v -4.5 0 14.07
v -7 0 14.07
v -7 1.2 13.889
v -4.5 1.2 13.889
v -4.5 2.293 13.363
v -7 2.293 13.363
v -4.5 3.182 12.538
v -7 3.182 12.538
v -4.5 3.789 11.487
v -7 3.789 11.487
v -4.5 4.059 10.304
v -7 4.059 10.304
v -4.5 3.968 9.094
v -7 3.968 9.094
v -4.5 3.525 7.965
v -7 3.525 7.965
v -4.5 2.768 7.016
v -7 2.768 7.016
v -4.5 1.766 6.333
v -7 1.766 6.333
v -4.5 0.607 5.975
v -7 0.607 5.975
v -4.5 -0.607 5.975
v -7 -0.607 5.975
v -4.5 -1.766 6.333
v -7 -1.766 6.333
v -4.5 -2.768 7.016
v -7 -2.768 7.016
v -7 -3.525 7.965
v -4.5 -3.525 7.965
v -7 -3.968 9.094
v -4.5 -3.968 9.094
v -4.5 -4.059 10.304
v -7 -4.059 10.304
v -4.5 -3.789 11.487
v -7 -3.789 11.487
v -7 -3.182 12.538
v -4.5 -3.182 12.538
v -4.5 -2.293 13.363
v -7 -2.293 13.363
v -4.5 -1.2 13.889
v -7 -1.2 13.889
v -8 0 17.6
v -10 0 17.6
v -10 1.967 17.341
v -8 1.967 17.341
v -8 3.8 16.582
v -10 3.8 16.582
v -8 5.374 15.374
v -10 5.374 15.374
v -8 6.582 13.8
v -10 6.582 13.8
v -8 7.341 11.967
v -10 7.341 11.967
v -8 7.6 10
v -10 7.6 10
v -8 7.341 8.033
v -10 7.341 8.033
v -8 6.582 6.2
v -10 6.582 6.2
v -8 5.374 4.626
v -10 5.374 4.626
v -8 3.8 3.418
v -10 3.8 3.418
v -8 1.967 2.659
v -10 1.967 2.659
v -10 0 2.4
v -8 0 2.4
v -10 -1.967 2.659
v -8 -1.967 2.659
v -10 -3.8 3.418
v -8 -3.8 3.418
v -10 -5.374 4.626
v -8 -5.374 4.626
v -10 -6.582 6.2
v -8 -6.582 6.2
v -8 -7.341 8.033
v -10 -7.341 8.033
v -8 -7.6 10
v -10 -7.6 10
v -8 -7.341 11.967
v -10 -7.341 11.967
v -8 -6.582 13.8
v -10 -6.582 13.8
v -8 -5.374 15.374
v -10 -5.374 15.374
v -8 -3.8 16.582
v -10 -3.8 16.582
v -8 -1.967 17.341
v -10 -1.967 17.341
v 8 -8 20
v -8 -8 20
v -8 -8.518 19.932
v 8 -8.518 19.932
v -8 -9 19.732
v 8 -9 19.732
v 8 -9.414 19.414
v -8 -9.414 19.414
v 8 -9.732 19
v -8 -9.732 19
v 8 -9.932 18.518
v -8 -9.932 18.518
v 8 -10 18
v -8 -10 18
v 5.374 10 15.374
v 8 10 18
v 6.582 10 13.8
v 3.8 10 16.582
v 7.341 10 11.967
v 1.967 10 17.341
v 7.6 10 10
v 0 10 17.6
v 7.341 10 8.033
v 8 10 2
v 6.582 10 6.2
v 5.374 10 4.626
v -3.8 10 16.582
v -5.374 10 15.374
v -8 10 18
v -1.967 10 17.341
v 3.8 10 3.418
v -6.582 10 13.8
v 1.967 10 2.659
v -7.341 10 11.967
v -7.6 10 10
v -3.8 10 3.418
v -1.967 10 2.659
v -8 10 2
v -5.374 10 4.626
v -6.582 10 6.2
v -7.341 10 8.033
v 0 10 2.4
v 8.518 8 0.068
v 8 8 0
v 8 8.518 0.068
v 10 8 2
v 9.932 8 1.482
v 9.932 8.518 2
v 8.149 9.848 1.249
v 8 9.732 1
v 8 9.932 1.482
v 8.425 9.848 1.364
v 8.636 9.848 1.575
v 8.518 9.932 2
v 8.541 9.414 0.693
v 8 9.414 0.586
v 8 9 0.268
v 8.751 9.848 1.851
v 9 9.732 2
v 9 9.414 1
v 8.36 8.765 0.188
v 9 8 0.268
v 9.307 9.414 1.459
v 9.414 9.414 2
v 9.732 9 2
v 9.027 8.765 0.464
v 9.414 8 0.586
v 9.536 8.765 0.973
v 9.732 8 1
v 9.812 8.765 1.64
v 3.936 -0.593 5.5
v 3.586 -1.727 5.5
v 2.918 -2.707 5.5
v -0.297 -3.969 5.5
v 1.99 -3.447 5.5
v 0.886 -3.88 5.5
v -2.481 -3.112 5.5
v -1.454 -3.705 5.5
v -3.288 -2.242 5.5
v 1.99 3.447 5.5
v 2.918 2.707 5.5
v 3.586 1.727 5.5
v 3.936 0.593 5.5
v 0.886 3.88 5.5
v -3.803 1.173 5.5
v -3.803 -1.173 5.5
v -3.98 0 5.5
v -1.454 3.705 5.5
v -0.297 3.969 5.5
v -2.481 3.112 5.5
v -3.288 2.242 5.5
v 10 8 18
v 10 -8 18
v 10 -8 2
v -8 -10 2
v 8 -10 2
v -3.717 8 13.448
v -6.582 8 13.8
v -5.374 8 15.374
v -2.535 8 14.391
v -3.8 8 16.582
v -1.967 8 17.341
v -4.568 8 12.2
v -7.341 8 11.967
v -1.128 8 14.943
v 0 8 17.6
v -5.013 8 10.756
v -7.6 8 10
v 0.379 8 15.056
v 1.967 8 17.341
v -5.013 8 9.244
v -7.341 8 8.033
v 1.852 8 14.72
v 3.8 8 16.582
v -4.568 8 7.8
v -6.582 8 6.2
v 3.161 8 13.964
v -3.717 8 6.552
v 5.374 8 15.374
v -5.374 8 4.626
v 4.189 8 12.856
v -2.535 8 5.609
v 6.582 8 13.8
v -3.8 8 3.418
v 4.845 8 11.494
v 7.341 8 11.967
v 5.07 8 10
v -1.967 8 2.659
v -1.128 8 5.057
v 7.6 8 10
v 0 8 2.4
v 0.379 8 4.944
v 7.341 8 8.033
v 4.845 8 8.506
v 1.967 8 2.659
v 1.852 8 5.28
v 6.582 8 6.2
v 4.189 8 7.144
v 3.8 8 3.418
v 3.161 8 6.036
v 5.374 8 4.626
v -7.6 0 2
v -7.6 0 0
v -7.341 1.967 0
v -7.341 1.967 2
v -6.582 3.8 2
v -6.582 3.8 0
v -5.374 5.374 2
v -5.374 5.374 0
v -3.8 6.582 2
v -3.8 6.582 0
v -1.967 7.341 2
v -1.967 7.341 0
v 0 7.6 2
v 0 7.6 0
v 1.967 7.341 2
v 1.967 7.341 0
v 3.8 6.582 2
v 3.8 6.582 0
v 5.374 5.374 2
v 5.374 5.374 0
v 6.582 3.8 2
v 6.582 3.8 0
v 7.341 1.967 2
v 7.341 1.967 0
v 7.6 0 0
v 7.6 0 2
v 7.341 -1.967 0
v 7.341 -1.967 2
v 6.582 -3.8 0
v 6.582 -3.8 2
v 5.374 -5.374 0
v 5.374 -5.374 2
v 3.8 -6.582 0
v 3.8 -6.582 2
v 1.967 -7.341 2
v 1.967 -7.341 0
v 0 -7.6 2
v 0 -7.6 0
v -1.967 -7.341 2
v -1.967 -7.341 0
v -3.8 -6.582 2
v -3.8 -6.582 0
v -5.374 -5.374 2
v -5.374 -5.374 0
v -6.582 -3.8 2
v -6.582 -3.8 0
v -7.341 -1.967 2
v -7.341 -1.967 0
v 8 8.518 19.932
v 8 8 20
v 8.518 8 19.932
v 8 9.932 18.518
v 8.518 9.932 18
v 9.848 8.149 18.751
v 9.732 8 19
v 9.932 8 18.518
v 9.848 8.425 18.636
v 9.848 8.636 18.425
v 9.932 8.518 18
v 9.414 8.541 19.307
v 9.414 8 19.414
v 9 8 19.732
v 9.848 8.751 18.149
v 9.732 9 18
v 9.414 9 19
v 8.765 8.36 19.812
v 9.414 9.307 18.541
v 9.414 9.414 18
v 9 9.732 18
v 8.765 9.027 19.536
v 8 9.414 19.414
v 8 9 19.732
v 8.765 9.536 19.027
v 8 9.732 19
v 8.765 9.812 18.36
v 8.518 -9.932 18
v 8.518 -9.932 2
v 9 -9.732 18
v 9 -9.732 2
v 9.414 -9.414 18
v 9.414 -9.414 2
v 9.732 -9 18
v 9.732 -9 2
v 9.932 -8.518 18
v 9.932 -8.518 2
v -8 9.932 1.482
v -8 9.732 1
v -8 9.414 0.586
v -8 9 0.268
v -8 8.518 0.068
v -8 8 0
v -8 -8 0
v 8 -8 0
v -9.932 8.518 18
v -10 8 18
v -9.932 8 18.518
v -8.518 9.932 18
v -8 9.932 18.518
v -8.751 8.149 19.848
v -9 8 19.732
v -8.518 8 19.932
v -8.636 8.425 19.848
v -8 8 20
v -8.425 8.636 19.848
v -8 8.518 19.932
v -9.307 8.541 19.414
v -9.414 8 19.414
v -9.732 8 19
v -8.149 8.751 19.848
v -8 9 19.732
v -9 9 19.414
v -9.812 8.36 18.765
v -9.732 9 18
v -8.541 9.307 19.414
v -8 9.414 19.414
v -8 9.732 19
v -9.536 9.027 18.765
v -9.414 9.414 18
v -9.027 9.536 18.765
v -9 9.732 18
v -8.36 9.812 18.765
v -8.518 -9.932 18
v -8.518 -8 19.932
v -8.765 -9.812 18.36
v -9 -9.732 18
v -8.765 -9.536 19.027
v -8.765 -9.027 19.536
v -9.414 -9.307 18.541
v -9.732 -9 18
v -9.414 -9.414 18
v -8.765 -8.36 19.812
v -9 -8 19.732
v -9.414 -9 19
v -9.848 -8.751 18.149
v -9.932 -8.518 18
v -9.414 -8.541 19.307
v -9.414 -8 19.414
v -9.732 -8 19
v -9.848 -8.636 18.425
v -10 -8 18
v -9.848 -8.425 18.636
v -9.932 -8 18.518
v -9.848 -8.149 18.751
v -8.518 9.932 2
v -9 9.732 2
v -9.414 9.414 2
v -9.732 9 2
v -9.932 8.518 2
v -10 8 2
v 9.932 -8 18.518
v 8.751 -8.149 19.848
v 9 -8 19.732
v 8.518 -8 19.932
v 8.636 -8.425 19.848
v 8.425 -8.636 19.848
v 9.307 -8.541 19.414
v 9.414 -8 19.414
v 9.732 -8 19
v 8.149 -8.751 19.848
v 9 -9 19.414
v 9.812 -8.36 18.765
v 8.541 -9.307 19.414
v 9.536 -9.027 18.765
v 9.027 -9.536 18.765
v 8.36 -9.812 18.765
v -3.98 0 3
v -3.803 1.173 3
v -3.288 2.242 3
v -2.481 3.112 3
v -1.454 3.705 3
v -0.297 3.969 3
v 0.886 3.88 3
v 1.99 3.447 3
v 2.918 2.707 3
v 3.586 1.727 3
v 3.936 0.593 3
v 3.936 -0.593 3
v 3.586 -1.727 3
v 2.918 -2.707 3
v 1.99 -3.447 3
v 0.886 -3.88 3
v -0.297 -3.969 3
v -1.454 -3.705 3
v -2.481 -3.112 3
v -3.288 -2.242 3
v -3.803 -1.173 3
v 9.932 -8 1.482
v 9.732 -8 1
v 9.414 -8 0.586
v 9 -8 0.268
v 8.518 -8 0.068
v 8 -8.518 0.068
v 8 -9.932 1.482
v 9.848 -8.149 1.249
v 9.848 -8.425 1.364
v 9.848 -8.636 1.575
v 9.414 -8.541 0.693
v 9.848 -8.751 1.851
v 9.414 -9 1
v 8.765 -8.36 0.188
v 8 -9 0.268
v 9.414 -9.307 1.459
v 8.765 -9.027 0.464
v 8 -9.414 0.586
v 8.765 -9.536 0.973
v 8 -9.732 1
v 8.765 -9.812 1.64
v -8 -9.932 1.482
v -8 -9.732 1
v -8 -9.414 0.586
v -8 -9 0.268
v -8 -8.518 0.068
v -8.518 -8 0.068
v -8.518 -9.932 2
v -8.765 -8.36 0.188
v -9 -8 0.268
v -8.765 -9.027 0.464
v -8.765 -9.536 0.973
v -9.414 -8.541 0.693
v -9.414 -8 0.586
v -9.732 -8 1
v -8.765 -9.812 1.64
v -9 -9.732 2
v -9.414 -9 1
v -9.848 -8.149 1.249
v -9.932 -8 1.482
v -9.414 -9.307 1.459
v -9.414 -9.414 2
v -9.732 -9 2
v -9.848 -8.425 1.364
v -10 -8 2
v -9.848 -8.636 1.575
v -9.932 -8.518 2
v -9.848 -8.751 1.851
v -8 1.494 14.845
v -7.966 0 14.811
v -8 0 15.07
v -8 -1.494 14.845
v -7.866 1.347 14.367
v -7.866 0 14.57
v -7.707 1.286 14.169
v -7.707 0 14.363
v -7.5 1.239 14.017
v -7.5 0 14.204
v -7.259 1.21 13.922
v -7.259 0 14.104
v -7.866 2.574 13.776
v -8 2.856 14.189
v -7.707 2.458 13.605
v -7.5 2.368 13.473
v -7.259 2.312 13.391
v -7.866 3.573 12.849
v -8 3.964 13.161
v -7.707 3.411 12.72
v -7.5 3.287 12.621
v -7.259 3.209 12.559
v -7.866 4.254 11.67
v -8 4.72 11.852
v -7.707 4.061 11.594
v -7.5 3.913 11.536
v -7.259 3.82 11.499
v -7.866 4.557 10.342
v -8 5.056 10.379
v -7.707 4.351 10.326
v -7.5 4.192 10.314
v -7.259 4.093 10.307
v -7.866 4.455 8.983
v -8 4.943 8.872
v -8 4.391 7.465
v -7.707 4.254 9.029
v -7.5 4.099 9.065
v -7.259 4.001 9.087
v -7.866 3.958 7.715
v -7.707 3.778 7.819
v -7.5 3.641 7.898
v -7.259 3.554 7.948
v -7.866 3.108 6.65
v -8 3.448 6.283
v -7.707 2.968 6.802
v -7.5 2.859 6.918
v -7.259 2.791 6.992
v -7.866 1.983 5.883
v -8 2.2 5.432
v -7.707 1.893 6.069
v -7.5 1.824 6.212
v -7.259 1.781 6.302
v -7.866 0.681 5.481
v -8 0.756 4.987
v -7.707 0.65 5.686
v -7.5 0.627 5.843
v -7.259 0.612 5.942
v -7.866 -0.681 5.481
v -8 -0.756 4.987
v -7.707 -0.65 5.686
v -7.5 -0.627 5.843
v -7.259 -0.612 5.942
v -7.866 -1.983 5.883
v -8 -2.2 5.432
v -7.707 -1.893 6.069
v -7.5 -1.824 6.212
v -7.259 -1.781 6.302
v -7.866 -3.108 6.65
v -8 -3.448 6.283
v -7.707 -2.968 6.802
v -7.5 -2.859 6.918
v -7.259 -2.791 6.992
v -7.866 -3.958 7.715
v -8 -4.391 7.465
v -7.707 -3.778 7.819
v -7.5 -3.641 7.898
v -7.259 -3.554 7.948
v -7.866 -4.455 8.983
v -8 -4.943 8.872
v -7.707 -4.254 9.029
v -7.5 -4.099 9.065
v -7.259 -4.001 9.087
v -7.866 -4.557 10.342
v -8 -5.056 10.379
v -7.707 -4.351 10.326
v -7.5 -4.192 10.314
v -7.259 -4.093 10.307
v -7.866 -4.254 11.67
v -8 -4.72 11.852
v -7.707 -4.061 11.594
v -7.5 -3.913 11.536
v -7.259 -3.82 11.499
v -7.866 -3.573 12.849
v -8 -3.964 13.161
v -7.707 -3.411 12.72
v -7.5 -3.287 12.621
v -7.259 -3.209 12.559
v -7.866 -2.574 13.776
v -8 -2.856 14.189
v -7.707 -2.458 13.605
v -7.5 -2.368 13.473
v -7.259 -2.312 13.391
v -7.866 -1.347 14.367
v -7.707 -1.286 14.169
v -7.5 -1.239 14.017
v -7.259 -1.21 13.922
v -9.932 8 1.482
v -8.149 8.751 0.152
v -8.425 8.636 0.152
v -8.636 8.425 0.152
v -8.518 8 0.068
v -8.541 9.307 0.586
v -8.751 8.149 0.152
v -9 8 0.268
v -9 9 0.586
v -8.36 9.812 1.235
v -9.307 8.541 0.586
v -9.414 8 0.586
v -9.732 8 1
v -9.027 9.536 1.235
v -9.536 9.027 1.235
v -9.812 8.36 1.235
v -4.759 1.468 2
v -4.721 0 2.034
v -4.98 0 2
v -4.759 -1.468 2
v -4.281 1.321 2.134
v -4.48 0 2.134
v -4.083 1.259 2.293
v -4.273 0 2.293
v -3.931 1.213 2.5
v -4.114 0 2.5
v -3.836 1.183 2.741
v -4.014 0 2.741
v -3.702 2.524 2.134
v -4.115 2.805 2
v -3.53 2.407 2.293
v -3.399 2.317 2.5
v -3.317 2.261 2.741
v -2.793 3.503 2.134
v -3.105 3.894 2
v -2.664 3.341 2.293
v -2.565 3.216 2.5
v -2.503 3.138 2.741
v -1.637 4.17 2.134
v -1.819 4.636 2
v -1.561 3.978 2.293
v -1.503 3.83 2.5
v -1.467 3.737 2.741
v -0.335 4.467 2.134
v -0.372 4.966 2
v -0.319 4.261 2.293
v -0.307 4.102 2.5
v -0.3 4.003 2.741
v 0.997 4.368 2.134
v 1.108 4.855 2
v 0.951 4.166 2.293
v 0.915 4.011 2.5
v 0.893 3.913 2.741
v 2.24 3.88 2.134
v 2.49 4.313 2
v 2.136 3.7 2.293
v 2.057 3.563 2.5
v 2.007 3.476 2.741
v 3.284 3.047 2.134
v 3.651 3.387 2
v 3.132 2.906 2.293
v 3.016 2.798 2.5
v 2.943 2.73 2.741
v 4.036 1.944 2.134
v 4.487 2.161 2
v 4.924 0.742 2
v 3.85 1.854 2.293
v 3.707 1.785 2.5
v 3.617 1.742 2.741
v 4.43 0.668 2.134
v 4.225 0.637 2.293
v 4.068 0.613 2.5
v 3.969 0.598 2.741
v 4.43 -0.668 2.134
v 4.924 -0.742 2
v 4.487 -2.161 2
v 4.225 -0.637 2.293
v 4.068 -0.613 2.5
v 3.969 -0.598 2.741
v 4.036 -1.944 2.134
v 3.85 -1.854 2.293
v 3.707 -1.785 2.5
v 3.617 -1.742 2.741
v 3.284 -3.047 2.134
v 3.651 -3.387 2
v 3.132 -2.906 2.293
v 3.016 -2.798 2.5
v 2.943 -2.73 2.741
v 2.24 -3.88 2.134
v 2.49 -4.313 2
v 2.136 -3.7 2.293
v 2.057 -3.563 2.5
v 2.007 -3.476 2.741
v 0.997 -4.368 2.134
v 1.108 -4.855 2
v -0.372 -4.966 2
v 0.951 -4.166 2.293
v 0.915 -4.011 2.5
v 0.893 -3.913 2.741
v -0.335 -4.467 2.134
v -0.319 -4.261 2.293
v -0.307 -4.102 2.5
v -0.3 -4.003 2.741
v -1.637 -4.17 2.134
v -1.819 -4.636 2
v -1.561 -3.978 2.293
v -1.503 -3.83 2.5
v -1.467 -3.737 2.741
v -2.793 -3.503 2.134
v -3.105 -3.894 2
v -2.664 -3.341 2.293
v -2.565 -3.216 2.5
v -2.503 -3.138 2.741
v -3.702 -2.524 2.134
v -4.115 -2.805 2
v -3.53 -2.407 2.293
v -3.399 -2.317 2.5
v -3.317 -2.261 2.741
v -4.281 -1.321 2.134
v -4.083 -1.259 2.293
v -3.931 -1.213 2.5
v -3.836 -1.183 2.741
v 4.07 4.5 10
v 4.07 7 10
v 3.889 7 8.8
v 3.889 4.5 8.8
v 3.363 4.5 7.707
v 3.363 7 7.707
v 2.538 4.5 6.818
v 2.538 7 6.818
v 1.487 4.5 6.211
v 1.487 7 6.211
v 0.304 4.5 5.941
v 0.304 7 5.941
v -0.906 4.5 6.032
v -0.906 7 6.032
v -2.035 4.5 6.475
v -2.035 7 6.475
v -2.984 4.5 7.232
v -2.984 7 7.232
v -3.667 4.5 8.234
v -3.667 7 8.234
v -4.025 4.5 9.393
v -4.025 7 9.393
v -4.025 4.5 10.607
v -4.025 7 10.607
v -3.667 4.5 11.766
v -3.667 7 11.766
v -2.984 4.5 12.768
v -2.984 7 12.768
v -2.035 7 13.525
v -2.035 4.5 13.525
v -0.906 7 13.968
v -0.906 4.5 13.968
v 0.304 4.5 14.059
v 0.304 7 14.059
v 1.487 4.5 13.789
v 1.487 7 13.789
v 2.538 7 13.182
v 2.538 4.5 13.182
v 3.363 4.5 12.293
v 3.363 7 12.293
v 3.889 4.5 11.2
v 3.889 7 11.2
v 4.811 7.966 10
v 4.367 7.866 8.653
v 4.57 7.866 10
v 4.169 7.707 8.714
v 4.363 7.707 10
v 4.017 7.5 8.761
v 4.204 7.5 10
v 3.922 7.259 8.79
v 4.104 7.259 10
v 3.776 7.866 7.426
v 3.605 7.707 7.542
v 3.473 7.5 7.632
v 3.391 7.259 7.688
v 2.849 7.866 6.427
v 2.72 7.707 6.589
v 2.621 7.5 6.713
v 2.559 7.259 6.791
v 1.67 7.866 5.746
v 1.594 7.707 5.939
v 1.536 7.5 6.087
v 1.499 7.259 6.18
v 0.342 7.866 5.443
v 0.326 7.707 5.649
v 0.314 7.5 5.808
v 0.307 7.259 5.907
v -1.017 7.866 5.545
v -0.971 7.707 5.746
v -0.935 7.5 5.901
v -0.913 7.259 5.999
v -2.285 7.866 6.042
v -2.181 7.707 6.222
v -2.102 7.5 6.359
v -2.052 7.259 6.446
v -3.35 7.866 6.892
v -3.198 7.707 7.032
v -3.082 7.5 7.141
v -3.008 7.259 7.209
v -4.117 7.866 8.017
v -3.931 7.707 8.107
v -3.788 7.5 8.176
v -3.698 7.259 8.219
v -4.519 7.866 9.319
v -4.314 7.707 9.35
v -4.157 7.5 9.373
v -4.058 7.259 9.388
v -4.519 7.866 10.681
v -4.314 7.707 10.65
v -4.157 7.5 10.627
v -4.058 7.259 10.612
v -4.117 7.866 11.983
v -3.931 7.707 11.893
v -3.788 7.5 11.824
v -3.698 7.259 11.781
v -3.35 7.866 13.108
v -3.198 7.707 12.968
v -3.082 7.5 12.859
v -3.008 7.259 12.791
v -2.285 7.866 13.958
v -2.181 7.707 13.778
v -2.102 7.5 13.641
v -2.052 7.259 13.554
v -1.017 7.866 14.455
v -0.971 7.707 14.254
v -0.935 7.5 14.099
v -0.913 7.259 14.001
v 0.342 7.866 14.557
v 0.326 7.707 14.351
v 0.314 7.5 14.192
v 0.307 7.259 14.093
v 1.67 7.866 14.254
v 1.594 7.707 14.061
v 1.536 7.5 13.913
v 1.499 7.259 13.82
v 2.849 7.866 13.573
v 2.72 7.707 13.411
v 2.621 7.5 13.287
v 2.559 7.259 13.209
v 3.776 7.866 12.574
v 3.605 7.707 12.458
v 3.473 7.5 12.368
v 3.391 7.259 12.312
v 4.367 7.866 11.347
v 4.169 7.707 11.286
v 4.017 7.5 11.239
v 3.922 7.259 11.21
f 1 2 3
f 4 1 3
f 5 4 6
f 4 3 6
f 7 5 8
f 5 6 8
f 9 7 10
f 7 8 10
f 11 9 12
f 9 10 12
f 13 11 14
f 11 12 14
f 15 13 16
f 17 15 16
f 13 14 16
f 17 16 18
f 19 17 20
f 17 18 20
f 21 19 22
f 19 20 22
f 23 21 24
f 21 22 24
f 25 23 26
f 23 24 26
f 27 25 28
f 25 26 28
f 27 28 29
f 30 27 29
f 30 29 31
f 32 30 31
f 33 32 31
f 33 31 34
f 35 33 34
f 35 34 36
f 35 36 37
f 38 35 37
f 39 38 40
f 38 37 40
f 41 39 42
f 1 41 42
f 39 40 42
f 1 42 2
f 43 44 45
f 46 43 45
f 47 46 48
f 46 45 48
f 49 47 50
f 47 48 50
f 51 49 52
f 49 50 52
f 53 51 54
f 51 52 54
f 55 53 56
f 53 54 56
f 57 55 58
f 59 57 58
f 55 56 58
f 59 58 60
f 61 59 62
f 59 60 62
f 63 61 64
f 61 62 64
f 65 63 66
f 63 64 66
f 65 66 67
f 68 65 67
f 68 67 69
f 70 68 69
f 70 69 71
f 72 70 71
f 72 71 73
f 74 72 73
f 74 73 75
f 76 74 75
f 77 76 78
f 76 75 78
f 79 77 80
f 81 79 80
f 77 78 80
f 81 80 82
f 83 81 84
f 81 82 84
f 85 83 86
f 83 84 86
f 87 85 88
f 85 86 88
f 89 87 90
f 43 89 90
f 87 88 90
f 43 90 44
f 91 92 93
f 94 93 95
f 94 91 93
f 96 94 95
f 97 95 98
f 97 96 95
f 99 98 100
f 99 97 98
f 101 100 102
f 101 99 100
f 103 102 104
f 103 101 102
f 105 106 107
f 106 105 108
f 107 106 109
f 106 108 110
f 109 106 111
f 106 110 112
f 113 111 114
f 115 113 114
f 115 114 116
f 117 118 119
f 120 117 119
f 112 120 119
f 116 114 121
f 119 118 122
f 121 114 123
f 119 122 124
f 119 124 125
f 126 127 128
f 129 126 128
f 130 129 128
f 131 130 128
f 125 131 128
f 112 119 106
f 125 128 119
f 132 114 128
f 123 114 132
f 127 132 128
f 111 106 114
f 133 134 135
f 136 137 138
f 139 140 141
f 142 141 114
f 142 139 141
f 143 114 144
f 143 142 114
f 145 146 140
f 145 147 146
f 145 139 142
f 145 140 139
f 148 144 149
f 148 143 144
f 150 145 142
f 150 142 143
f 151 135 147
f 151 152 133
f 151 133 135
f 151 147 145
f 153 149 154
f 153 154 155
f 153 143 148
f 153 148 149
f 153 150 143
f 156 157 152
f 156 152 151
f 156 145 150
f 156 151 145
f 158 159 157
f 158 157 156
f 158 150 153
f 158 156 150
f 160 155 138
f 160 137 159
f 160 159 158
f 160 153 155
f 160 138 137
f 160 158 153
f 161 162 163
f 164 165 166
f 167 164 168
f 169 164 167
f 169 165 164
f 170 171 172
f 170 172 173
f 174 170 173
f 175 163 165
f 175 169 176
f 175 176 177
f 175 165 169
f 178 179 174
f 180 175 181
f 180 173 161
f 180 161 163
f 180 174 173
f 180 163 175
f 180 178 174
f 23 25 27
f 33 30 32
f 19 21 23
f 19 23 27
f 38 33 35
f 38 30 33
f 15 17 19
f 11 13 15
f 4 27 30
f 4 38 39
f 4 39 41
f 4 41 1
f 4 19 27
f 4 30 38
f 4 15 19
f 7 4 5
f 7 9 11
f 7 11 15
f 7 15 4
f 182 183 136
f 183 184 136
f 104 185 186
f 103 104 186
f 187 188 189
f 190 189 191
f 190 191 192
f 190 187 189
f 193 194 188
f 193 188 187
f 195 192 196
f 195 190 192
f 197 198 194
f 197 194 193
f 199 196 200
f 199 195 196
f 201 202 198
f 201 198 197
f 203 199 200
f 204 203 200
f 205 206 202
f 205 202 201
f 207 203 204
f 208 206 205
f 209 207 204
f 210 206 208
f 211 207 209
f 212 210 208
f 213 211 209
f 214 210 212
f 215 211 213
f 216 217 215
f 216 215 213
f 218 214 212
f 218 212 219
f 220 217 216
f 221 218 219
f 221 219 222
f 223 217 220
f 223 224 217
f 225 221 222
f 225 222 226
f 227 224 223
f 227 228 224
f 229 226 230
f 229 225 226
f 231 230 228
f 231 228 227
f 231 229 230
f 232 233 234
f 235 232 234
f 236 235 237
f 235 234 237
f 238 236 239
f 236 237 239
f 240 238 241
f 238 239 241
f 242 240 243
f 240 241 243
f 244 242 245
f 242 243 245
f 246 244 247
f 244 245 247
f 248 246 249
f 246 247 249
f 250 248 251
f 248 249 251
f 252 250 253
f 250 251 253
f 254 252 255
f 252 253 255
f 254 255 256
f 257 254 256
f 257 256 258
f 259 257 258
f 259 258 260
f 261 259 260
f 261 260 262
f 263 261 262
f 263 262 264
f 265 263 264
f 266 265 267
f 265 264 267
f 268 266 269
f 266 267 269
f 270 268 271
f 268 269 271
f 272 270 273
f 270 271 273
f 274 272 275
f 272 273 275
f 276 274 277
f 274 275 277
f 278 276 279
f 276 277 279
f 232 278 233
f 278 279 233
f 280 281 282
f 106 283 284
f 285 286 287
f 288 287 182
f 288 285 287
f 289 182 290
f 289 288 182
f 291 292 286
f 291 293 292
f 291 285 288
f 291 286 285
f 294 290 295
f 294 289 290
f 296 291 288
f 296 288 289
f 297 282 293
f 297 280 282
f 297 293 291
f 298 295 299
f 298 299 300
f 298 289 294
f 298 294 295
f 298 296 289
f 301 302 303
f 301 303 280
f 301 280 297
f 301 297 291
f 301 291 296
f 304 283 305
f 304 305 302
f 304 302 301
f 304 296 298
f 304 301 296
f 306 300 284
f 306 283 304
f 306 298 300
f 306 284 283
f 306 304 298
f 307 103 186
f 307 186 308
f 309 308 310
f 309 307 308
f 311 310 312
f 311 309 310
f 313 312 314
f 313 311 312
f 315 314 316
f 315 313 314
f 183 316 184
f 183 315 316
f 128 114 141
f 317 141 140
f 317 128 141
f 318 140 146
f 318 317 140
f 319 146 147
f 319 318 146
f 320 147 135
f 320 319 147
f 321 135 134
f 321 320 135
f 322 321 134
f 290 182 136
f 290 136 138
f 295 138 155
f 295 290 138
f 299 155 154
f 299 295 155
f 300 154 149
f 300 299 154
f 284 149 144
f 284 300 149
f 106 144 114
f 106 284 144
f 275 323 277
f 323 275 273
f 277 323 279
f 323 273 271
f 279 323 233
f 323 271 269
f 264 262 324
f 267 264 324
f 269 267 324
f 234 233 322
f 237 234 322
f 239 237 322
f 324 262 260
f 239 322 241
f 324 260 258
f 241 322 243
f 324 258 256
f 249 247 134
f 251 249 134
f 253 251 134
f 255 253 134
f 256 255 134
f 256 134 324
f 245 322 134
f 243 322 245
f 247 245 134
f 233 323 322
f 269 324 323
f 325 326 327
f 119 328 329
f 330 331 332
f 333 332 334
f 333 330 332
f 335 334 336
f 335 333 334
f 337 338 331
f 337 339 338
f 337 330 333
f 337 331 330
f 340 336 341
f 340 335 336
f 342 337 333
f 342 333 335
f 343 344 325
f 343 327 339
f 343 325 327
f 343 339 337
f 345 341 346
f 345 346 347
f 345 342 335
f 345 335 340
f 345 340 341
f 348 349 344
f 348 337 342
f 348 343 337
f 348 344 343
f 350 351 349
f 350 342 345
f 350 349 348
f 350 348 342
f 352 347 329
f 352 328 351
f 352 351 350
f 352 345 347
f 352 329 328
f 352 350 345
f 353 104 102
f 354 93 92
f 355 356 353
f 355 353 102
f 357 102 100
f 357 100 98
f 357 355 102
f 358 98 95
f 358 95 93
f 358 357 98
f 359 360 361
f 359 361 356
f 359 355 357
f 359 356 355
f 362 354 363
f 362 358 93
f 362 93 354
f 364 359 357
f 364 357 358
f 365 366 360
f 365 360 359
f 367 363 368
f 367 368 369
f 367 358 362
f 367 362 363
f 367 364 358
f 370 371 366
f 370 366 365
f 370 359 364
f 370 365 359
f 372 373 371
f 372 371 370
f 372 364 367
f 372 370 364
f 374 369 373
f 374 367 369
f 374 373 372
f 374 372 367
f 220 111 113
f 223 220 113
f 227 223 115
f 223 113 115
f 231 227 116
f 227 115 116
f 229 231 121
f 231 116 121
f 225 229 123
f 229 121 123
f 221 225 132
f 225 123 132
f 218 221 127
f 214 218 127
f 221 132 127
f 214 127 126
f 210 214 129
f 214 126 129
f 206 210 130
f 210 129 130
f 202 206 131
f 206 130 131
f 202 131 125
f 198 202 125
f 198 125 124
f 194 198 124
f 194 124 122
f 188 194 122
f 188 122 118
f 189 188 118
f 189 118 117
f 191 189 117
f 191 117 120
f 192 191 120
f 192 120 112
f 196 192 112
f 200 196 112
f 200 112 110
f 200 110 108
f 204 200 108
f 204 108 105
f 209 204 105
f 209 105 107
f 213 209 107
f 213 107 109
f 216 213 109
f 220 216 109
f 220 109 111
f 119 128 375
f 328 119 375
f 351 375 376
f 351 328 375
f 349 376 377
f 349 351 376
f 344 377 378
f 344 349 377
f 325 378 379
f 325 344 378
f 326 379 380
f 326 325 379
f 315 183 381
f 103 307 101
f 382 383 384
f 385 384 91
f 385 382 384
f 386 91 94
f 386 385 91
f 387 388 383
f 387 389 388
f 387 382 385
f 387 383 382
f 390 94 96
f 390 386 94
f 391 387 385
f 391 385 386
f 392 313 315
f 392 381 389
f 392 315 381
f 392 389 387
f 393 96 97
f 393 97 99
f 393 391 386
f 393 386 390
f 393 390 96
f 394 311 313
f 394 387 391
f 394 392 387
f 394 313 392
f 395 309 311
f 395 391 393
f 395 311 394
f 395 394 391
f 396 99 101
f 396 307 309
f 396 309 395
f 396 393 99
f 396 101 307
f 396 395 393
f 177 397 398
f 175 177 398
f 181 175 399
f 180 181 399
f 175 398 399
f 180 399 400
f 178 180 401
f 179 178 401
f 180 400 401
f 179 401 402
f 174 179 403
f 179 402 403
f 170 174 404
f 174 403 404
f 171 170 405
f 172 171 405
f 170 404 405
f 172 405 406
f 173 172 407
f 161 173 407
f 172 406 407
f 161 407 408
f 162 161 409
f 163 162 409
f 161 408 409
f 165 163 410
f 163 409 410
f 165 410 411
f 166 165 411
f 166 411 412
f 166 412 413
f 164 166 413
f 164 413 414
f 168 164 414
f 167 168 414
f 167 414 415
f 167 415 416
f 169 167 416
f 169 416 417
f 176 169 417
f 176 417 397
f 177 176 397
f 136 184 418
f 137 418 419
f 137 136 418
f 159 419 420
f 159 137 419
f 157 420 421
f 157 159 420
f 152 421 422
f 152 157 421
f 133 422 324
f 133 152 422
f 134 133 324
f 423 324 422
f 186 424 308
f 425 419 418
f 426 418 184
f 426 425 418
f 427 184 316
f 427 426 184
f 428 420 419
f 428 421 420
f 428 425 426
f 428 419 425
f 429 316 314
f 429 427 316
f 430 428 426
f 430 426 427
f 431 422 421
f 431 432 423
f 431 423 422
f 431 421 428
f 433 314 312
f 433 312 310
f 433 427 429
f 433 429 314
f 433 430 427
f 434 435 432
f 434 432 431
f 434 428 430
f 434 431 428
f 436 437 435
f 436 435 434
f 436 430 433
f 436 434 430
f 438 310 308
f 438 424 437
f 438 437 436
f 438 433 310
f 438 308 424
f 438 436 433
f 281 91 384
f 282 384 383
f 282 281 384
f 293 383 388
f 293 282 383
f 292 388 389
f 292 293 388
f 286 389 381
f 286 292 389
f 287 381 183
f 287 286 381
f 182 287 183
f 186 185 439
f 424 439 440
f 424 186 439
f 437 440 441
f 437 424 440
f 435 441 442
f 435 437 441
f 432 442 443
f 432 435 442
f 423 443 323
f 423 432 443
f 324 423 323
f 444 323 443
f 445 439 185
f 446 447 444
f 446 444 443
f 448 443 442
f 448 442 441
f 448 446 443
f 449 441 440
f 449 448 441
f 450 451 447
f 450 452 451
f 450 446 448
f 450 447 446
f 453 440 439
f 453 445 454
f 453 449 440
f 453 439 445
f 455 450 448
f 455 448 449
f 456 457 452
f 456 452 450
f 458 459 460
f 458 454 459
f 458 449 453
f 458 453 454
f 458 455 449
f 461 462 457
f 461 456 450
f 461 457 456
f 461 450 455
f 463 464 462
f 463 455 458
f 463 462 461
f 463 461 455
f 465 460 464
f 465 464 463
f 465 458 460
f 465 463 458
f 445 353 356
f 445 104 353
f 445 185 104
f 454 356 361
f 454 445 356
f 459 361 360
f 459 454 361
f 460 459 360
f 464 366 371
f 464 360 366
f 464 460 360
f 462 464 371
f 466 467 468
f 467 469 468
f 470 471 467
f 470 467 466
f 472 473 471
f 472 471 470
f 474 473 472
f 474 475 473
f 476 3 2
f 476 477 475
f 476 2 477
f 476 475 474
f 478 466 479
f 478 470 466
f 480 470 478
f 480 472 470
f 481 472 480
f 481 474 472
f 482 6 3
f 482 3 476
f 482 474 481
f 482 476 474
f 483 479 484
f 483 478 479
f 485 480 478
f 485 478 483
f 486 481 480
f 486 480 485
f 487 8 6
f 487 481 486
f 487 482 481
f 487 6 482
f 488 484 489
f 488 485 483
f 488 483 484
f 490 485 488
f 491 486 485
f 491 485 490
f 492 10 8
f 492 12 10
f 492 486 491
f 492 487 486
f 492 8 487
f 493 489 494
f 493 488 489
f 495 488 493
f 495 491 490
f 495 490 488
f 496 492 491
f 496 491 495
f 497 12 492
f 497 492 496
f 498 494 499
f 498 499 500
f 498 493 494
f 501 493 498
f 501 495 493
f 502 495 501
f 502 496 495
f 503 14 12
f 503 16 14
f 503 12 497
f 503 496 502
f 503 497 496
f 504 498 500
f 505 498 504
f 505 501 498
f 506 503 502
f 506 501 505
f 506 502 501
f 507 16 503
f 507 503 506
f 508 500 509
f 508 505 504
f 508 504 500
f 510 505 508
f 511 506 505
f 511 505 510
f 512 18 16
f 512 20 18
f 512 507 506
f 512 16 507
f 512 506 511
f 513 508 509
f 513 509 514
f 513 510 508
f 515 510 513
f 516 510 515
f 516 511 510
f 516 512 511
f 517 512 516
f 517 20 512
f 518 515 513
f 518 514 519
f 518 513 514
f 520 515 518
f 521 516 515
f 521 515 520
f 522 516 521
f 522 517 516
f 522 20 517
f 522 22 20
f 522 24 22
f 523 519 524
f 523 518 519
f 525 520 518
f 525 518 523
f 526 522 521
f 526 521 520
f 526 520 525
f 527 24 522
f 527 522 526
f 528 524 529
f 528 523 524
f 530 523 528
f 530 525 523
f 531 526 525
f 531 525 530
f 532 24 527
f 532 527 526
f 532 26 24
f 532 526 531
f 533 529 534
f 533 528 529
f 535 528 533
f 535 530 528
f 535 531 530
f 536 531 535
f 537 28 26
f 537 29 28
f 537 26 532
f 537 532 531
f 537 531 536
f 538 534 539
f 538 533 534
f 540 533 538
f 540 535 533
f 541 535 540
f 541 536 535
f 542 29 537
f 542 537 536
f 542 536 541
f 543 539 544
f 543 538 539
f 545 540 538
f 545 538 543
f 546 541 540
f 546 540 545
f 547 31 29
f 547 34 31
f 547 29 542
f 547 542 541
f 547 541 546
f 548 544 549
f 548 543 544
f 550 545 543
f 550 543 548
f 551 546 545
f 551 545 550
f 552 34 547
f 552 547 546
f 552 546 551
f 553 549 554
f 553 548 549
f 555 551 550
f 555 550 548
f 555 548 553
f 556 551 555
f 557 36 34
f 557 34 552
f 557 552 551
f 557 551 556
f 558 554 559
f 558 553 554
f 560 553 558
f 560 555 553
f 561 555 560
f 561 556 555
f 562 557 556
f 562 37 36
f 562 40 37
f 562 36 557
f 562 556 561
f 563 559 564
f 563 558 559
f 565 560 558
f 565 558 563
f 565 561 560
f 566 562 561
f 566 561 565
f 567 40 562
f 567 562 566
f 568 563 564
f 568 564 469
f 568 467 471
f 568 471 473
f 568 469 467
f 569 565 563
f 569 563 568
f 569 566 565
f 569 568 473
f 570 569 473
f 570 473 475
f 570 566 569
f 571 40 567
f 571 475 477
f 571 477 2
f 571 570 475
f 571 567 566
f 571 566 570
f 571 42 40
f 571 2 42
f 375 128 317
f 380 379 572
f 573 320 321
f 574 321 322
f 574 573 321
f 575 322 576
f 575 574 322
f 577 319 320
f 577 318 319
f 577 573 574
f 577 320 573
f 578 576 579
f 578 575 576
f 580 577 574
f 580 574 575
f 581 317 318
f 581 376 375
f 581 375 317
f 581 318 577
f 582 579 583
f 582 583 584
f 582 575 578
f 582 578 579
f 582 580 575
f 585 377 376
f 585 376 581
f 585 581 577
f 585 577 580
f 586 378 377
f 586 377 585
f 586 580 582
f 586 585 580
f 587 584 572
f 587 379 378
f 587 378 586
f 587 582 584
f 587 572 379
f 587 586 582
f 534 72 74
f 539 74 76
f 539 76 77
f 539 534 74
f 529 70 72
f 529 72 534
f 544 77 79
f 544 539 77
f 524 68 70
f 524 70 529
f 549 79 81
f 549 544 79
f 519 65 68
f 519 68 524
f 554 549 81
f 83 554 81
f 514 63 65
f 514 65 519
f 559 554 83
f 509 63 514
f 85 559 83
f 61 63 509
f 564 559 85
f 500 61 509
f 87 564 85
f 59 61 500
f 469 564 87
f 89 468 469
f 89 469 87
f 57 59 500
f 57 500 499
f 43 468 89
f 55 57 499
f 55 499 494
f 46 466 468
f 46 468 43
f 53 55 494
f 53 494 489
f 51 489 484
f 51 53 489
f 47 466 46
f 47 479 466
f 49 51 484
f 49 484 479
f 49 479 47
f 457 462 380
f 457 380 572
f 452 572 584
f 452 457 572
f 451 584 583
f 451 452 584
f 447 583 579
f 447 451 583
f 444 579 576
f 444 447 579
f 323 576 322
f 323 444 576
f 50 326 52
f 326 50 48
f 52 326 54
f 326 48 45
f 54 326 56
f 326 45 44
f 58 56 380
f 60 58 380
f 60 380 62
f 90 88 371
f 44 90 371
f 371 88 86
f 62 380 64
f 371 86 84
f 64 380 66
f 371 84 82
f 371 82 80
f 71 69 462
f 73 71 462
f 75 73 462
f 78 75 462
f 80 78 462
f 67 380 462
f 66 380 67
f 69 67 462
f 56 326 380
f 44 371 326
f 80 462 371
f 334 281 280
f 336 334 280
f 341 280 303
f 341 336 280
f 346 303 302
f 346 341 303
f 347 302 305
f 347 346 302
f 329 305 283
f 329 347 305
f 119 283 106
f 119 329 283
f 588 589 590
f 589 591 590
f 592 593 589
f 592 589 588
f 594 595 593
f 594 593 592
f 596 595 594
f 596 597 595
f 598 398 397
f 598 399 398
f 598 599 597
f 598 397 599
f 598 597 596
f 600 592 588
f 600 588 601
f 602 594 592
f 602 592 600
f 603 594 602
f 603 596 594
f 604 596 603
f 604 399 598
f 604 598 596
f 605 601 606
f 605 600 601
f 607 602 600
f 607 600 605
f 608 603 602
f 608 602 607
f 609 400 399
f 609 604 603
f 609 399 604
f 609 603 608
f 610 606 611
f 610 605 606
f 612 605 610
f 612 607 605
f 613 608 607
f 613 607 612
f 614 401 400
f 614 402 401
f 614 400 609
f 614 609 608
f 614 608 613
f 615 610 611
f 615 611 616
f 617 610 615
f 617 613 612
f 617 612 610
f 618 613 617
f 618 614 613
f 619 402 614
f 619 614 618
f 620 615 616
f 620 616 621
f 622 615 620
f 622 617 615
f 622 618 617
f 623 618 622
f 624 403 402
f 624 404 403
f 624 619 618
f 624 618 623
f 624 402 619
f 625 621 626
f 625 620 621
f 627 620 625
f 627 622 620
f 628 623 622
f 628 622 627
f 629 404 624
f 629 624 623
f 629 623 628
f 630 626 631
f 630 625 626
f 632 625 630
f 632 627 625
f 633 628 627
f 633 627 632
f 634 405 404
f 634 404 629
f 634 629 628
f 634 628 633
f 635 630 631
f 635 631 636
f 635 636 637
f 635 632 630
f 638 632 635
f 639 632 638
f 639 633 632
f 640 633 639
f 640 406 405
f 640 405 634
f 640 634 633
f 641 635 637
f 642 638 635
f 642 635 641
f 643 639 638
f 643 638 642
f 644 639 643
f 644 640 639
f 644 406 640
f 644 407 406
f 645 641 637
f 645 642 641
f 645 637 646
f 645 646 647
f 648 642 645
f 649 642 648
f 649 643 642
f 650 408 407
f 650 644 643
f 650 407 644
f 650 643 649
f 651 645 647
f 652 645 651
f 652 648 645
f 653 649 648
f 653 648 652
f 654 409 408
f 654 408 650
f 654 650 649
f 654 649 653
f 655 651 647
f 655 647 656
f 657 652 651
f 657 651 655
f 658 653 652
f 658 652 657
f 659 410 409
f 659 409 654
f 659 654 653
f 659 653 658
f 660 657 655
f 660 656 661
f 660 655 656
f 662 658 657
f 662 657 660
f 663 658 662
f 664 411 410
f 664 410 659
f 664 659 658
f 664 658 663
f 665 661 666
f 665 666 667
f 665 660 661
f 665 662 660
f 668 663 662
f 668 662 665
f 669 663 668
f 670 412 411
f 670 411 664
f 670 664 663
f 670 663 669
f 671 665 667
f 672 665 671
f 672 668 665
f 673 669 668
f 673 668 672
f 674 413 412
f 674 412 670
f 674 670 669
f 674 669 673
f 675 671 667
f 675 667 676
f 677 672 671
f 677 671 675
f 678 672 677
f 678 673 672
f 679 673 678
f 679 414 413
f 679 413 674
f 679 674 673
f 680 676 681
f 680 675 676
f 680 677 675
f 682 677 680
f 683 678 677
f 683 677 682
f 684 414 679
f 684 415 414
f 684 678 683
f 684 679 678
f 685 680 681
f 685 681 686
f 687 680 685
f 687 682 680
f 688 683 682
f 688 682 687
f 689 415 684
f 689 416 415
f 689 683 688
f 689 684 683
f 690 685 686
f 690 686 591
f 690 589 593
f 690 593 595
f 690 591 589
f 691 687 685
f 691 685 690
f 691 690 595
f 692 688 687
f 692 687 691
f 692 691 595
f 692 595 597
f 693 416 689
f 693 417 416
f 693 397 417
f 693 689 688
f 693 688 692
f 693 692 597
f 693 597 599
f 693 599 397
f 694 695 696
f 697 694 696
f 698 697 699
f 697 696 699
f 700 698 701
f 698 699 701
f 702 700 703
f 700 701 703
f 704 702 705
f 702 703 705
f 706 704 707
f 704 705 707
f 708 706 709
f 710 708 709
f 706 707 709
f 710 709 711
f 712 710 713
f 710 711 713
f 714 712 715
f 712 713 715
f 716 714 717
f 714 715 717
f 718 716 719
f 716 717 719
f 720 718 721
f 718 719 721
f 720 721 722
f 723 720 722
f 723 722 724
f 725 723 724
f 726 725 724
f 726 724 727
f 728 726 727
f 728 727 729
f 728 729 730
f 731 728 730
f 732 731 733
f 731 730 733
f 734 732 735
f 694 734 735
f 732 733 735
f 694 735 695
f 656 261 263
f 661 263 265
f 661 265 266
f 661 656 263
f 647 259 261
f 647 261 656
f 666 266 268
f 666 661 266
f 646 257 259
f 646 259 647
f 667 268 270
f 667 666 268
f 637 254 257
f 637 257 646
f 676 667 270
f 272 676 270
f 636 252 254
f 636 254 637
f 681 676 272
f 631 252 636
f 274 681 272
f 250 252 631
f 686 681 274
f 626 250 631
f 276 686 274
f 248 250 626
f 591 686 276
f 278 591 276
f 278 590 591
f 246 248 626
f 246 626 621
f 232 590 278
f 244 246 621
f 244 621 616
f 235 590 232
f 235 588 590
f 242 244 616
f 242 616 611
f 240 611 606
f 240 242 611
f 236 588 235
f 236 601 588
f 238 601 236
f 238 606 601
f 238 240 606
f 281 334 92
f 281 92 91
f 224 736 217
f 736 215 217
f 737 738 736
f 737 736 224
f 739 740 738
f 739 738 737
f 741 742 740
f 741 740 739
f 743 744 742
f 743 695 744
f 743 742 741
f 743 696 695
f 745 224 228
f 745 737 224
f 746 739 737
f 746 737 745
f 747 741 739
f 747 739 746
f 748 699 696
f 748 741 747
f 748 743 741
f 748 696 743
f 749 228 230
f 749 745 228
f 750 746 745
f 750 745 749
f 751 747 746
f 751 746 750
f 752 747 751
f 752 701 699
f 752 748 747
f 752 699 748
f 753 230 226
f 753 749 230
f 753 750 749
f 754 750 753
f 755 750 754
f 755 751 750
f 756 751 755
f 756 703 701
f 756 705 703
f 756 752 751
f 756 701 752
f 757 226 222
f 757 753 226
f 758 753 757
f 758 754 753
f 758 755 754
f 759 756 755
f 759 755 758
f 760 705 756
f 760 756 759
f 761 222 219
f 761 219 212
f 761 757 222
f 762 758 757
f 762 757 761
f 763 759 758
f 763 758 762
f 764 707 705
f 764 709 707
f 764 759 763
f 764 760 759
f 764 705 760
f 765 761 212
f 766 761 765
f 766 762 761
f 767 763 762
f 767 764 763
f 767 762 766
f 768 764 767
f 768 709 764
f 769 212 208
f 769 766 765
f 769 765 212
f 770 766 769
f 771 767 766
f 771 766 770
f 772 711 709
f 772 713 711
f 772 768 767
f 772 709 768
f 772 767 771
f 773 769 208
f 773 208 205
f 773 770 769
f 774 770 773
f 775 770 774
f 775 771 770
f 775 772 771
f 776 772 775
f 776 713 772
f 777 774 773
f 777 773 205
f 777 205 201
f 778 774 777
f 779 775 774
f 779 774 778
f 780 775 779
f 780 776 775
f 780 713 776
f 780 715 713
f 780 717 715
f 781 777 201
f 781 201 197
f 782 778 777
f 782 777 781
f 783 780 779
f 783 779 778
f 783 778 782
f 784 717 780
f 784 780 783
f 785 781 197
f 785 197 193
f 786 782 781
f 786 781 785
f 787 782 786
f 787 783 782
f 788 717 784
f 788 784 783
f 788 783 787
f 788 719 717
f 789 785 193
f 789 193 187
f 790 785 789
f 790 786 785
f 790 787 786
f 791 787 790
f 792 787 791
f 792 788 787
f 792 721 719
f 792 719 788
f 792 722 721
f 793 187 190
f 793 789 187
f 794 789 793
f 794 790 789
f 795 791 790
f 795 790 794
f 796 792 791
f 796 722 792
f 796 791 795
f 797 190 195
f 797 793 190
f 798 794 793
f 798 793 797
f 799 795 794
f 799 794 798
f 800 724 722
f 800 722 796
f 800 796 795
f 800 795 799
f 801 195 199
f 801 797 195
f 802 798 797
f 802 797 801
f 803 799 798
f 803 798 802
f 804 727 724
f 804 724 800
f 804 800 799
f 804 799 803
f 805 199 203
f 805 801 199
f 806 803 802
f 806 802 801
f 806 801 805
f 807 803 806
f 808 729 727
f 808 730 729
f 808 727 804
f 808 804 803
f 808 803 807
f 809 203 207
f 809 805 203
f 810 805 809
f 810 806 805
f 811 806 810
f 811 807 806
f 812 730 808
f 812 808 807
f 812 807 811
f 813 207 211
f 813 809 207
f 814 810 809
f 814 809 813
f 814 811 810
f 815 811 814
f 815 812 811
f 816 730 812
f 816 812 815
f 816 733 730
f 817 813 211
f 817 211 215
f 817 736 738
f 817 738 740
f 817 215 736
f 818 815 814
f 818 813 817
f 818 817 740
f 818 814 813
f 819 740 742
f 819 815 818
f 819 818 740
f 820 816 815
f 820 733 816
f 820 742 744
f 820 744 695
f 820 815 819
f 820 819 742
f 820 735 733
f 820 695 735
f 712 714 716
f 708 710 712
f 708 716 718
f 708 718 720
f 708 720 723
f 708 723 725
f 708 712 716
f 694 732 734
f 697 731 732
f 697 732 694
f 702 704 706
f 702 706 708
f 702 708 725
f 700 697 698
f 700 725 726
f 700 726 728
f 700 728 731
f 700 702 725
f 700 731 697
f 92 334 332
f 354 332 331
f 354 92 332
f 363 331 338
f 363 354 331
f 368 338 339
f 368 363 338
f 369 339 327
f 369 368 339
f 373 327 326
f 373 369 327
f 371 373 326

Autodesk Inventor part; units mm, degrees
ref_plane "YZ Plane" through (0, 0, 0) normal (1, 0, 0) x (0, 1, 0)
ref_plane "XZ Plane" through (0, 0, 0) normal (0, 1, 0) x (-1, 0, 0)
ref_plane "XY Plane" through (0, 0, 0) normal (0, 0, 1) x (1, 0, 0)
sketch "Sketch1" plane through (0, 0, 0) normal (0, 0, 1) x (1, 0, 0)
  line L0 (-10, -10) -> (10, -10)
  line L1 (10, -10) -> (10, 10)
  line L2 (10, 10) -> (-10, 10)
  line L3 (-10, 10) -> (-10, -10)
  line L4 (-10, -10) -> (10, 10) construction
  line L5 (10, -10) -> (-10, 10) construction
  point P0 (0, 0)
  dimension "d0" = 20
  dimension "d1" = 20
extrude "Extrusion1" add sketch "Sketch1" along normal blind 20
sketch "Sketch2" plane through (-10, 10, 0) normal (0, 1, 0) x (1, 0, 0)
  circle A0 centre (10, -10) radius 7.6
  line L0 (0, 0) -> (0, -20) projected
  point P0 (10, 0)
  dimension "d4" = 15.2
  dimension "d5" = 10
  dimension "d6" = 10
extrude "Extrusion2" cut sketch "Sketch2" against normal blind 2
sketch "Sketch3" plane through (0, 0, 0) normal (0, 0, -1) x (-1, 0, 0)
  circle A0 centre (0, 0) radius 7.6
  dimension "d9" = 15.2
extrude "Extrusion3" cut sketch "Sketch3" against normal blind 2
sketch "Sketch4" plane through (-10, -10, 0) normal (-1, 0, 0) x (0, 0, 1)
  circle A0 centre (10, 10) radius 7.6
  line L0 (0, 20) -> (0, 0) projected
  line L1 (0, 20) -> (20, 20) projected
  point P0 (0, 10)
  dimension "d12" = 15.2
  dimension "d13" = 10
  dimension "d14" = 10
extrude "Extrusion4" cut sketch "Sketch4" against normal blind 2
fillet "Fillet1" radius 2 11 edges at (-10, 10, 10) (0, 10, 20) (-10, 0, 20) (-10, 0, 0) (0, -10, 0) (10, 0, 0) (0, 10, 0) (10, 10, 10) (10, -10, 10) (0, -10, 20) (10, 0, 20)
sketch "Sketch5" plane through (-8, 0, 10) normal (-1, 0, 0) x (0, 0, 1)
  circle A0 centre (0, 0) radius 4.07
  point P0 (-10, 0)
  dimension "d18" = 8.14
extrude "Extrusion5" cut sketch "Sketch5" against normal blind 3.5
sketch "Sketch6" plane through (0, 0, 2) normal (0, 0, -1) x (-1, 0, 0)
  circle A0 centre (0, 0) radius 3.98
  dimension "d21" = 7.96
extrude "Extrusion6" cut sketch "Sketch6" against normal blind 3.5
sketch "Sketch7" plane through (0, 8, 10) normal (0, 1, 0) x (1, 0, 0)
  circle A0 centre (0, 0) radius 4.07
  point P0 (0, 10)
  dimension "d24" = 8.14
extrude "Extrusion7" cut sketch "Sketch7" against normal blind 3.5
fillet "Fillet2" radius 2 3 edges at (-9.4142, -9.4142, 19.4142) (-9.4142, -9.4142, 0.5858) (-10, -10, 10)
fillet "Fillet3" radius 1 1 edges at (-8, 0, 5.93)
fillet "Fillet4" radius 1 1 edges at (-4.07, 8, 10)
fillet "Fillet5" radius 1 1 edges at (3.98, 0, 2)
equation "\"d1\" = d0"
equation "\"d6\" = d5"
equation "\"d13\" = d14"
properties part number "Center"
